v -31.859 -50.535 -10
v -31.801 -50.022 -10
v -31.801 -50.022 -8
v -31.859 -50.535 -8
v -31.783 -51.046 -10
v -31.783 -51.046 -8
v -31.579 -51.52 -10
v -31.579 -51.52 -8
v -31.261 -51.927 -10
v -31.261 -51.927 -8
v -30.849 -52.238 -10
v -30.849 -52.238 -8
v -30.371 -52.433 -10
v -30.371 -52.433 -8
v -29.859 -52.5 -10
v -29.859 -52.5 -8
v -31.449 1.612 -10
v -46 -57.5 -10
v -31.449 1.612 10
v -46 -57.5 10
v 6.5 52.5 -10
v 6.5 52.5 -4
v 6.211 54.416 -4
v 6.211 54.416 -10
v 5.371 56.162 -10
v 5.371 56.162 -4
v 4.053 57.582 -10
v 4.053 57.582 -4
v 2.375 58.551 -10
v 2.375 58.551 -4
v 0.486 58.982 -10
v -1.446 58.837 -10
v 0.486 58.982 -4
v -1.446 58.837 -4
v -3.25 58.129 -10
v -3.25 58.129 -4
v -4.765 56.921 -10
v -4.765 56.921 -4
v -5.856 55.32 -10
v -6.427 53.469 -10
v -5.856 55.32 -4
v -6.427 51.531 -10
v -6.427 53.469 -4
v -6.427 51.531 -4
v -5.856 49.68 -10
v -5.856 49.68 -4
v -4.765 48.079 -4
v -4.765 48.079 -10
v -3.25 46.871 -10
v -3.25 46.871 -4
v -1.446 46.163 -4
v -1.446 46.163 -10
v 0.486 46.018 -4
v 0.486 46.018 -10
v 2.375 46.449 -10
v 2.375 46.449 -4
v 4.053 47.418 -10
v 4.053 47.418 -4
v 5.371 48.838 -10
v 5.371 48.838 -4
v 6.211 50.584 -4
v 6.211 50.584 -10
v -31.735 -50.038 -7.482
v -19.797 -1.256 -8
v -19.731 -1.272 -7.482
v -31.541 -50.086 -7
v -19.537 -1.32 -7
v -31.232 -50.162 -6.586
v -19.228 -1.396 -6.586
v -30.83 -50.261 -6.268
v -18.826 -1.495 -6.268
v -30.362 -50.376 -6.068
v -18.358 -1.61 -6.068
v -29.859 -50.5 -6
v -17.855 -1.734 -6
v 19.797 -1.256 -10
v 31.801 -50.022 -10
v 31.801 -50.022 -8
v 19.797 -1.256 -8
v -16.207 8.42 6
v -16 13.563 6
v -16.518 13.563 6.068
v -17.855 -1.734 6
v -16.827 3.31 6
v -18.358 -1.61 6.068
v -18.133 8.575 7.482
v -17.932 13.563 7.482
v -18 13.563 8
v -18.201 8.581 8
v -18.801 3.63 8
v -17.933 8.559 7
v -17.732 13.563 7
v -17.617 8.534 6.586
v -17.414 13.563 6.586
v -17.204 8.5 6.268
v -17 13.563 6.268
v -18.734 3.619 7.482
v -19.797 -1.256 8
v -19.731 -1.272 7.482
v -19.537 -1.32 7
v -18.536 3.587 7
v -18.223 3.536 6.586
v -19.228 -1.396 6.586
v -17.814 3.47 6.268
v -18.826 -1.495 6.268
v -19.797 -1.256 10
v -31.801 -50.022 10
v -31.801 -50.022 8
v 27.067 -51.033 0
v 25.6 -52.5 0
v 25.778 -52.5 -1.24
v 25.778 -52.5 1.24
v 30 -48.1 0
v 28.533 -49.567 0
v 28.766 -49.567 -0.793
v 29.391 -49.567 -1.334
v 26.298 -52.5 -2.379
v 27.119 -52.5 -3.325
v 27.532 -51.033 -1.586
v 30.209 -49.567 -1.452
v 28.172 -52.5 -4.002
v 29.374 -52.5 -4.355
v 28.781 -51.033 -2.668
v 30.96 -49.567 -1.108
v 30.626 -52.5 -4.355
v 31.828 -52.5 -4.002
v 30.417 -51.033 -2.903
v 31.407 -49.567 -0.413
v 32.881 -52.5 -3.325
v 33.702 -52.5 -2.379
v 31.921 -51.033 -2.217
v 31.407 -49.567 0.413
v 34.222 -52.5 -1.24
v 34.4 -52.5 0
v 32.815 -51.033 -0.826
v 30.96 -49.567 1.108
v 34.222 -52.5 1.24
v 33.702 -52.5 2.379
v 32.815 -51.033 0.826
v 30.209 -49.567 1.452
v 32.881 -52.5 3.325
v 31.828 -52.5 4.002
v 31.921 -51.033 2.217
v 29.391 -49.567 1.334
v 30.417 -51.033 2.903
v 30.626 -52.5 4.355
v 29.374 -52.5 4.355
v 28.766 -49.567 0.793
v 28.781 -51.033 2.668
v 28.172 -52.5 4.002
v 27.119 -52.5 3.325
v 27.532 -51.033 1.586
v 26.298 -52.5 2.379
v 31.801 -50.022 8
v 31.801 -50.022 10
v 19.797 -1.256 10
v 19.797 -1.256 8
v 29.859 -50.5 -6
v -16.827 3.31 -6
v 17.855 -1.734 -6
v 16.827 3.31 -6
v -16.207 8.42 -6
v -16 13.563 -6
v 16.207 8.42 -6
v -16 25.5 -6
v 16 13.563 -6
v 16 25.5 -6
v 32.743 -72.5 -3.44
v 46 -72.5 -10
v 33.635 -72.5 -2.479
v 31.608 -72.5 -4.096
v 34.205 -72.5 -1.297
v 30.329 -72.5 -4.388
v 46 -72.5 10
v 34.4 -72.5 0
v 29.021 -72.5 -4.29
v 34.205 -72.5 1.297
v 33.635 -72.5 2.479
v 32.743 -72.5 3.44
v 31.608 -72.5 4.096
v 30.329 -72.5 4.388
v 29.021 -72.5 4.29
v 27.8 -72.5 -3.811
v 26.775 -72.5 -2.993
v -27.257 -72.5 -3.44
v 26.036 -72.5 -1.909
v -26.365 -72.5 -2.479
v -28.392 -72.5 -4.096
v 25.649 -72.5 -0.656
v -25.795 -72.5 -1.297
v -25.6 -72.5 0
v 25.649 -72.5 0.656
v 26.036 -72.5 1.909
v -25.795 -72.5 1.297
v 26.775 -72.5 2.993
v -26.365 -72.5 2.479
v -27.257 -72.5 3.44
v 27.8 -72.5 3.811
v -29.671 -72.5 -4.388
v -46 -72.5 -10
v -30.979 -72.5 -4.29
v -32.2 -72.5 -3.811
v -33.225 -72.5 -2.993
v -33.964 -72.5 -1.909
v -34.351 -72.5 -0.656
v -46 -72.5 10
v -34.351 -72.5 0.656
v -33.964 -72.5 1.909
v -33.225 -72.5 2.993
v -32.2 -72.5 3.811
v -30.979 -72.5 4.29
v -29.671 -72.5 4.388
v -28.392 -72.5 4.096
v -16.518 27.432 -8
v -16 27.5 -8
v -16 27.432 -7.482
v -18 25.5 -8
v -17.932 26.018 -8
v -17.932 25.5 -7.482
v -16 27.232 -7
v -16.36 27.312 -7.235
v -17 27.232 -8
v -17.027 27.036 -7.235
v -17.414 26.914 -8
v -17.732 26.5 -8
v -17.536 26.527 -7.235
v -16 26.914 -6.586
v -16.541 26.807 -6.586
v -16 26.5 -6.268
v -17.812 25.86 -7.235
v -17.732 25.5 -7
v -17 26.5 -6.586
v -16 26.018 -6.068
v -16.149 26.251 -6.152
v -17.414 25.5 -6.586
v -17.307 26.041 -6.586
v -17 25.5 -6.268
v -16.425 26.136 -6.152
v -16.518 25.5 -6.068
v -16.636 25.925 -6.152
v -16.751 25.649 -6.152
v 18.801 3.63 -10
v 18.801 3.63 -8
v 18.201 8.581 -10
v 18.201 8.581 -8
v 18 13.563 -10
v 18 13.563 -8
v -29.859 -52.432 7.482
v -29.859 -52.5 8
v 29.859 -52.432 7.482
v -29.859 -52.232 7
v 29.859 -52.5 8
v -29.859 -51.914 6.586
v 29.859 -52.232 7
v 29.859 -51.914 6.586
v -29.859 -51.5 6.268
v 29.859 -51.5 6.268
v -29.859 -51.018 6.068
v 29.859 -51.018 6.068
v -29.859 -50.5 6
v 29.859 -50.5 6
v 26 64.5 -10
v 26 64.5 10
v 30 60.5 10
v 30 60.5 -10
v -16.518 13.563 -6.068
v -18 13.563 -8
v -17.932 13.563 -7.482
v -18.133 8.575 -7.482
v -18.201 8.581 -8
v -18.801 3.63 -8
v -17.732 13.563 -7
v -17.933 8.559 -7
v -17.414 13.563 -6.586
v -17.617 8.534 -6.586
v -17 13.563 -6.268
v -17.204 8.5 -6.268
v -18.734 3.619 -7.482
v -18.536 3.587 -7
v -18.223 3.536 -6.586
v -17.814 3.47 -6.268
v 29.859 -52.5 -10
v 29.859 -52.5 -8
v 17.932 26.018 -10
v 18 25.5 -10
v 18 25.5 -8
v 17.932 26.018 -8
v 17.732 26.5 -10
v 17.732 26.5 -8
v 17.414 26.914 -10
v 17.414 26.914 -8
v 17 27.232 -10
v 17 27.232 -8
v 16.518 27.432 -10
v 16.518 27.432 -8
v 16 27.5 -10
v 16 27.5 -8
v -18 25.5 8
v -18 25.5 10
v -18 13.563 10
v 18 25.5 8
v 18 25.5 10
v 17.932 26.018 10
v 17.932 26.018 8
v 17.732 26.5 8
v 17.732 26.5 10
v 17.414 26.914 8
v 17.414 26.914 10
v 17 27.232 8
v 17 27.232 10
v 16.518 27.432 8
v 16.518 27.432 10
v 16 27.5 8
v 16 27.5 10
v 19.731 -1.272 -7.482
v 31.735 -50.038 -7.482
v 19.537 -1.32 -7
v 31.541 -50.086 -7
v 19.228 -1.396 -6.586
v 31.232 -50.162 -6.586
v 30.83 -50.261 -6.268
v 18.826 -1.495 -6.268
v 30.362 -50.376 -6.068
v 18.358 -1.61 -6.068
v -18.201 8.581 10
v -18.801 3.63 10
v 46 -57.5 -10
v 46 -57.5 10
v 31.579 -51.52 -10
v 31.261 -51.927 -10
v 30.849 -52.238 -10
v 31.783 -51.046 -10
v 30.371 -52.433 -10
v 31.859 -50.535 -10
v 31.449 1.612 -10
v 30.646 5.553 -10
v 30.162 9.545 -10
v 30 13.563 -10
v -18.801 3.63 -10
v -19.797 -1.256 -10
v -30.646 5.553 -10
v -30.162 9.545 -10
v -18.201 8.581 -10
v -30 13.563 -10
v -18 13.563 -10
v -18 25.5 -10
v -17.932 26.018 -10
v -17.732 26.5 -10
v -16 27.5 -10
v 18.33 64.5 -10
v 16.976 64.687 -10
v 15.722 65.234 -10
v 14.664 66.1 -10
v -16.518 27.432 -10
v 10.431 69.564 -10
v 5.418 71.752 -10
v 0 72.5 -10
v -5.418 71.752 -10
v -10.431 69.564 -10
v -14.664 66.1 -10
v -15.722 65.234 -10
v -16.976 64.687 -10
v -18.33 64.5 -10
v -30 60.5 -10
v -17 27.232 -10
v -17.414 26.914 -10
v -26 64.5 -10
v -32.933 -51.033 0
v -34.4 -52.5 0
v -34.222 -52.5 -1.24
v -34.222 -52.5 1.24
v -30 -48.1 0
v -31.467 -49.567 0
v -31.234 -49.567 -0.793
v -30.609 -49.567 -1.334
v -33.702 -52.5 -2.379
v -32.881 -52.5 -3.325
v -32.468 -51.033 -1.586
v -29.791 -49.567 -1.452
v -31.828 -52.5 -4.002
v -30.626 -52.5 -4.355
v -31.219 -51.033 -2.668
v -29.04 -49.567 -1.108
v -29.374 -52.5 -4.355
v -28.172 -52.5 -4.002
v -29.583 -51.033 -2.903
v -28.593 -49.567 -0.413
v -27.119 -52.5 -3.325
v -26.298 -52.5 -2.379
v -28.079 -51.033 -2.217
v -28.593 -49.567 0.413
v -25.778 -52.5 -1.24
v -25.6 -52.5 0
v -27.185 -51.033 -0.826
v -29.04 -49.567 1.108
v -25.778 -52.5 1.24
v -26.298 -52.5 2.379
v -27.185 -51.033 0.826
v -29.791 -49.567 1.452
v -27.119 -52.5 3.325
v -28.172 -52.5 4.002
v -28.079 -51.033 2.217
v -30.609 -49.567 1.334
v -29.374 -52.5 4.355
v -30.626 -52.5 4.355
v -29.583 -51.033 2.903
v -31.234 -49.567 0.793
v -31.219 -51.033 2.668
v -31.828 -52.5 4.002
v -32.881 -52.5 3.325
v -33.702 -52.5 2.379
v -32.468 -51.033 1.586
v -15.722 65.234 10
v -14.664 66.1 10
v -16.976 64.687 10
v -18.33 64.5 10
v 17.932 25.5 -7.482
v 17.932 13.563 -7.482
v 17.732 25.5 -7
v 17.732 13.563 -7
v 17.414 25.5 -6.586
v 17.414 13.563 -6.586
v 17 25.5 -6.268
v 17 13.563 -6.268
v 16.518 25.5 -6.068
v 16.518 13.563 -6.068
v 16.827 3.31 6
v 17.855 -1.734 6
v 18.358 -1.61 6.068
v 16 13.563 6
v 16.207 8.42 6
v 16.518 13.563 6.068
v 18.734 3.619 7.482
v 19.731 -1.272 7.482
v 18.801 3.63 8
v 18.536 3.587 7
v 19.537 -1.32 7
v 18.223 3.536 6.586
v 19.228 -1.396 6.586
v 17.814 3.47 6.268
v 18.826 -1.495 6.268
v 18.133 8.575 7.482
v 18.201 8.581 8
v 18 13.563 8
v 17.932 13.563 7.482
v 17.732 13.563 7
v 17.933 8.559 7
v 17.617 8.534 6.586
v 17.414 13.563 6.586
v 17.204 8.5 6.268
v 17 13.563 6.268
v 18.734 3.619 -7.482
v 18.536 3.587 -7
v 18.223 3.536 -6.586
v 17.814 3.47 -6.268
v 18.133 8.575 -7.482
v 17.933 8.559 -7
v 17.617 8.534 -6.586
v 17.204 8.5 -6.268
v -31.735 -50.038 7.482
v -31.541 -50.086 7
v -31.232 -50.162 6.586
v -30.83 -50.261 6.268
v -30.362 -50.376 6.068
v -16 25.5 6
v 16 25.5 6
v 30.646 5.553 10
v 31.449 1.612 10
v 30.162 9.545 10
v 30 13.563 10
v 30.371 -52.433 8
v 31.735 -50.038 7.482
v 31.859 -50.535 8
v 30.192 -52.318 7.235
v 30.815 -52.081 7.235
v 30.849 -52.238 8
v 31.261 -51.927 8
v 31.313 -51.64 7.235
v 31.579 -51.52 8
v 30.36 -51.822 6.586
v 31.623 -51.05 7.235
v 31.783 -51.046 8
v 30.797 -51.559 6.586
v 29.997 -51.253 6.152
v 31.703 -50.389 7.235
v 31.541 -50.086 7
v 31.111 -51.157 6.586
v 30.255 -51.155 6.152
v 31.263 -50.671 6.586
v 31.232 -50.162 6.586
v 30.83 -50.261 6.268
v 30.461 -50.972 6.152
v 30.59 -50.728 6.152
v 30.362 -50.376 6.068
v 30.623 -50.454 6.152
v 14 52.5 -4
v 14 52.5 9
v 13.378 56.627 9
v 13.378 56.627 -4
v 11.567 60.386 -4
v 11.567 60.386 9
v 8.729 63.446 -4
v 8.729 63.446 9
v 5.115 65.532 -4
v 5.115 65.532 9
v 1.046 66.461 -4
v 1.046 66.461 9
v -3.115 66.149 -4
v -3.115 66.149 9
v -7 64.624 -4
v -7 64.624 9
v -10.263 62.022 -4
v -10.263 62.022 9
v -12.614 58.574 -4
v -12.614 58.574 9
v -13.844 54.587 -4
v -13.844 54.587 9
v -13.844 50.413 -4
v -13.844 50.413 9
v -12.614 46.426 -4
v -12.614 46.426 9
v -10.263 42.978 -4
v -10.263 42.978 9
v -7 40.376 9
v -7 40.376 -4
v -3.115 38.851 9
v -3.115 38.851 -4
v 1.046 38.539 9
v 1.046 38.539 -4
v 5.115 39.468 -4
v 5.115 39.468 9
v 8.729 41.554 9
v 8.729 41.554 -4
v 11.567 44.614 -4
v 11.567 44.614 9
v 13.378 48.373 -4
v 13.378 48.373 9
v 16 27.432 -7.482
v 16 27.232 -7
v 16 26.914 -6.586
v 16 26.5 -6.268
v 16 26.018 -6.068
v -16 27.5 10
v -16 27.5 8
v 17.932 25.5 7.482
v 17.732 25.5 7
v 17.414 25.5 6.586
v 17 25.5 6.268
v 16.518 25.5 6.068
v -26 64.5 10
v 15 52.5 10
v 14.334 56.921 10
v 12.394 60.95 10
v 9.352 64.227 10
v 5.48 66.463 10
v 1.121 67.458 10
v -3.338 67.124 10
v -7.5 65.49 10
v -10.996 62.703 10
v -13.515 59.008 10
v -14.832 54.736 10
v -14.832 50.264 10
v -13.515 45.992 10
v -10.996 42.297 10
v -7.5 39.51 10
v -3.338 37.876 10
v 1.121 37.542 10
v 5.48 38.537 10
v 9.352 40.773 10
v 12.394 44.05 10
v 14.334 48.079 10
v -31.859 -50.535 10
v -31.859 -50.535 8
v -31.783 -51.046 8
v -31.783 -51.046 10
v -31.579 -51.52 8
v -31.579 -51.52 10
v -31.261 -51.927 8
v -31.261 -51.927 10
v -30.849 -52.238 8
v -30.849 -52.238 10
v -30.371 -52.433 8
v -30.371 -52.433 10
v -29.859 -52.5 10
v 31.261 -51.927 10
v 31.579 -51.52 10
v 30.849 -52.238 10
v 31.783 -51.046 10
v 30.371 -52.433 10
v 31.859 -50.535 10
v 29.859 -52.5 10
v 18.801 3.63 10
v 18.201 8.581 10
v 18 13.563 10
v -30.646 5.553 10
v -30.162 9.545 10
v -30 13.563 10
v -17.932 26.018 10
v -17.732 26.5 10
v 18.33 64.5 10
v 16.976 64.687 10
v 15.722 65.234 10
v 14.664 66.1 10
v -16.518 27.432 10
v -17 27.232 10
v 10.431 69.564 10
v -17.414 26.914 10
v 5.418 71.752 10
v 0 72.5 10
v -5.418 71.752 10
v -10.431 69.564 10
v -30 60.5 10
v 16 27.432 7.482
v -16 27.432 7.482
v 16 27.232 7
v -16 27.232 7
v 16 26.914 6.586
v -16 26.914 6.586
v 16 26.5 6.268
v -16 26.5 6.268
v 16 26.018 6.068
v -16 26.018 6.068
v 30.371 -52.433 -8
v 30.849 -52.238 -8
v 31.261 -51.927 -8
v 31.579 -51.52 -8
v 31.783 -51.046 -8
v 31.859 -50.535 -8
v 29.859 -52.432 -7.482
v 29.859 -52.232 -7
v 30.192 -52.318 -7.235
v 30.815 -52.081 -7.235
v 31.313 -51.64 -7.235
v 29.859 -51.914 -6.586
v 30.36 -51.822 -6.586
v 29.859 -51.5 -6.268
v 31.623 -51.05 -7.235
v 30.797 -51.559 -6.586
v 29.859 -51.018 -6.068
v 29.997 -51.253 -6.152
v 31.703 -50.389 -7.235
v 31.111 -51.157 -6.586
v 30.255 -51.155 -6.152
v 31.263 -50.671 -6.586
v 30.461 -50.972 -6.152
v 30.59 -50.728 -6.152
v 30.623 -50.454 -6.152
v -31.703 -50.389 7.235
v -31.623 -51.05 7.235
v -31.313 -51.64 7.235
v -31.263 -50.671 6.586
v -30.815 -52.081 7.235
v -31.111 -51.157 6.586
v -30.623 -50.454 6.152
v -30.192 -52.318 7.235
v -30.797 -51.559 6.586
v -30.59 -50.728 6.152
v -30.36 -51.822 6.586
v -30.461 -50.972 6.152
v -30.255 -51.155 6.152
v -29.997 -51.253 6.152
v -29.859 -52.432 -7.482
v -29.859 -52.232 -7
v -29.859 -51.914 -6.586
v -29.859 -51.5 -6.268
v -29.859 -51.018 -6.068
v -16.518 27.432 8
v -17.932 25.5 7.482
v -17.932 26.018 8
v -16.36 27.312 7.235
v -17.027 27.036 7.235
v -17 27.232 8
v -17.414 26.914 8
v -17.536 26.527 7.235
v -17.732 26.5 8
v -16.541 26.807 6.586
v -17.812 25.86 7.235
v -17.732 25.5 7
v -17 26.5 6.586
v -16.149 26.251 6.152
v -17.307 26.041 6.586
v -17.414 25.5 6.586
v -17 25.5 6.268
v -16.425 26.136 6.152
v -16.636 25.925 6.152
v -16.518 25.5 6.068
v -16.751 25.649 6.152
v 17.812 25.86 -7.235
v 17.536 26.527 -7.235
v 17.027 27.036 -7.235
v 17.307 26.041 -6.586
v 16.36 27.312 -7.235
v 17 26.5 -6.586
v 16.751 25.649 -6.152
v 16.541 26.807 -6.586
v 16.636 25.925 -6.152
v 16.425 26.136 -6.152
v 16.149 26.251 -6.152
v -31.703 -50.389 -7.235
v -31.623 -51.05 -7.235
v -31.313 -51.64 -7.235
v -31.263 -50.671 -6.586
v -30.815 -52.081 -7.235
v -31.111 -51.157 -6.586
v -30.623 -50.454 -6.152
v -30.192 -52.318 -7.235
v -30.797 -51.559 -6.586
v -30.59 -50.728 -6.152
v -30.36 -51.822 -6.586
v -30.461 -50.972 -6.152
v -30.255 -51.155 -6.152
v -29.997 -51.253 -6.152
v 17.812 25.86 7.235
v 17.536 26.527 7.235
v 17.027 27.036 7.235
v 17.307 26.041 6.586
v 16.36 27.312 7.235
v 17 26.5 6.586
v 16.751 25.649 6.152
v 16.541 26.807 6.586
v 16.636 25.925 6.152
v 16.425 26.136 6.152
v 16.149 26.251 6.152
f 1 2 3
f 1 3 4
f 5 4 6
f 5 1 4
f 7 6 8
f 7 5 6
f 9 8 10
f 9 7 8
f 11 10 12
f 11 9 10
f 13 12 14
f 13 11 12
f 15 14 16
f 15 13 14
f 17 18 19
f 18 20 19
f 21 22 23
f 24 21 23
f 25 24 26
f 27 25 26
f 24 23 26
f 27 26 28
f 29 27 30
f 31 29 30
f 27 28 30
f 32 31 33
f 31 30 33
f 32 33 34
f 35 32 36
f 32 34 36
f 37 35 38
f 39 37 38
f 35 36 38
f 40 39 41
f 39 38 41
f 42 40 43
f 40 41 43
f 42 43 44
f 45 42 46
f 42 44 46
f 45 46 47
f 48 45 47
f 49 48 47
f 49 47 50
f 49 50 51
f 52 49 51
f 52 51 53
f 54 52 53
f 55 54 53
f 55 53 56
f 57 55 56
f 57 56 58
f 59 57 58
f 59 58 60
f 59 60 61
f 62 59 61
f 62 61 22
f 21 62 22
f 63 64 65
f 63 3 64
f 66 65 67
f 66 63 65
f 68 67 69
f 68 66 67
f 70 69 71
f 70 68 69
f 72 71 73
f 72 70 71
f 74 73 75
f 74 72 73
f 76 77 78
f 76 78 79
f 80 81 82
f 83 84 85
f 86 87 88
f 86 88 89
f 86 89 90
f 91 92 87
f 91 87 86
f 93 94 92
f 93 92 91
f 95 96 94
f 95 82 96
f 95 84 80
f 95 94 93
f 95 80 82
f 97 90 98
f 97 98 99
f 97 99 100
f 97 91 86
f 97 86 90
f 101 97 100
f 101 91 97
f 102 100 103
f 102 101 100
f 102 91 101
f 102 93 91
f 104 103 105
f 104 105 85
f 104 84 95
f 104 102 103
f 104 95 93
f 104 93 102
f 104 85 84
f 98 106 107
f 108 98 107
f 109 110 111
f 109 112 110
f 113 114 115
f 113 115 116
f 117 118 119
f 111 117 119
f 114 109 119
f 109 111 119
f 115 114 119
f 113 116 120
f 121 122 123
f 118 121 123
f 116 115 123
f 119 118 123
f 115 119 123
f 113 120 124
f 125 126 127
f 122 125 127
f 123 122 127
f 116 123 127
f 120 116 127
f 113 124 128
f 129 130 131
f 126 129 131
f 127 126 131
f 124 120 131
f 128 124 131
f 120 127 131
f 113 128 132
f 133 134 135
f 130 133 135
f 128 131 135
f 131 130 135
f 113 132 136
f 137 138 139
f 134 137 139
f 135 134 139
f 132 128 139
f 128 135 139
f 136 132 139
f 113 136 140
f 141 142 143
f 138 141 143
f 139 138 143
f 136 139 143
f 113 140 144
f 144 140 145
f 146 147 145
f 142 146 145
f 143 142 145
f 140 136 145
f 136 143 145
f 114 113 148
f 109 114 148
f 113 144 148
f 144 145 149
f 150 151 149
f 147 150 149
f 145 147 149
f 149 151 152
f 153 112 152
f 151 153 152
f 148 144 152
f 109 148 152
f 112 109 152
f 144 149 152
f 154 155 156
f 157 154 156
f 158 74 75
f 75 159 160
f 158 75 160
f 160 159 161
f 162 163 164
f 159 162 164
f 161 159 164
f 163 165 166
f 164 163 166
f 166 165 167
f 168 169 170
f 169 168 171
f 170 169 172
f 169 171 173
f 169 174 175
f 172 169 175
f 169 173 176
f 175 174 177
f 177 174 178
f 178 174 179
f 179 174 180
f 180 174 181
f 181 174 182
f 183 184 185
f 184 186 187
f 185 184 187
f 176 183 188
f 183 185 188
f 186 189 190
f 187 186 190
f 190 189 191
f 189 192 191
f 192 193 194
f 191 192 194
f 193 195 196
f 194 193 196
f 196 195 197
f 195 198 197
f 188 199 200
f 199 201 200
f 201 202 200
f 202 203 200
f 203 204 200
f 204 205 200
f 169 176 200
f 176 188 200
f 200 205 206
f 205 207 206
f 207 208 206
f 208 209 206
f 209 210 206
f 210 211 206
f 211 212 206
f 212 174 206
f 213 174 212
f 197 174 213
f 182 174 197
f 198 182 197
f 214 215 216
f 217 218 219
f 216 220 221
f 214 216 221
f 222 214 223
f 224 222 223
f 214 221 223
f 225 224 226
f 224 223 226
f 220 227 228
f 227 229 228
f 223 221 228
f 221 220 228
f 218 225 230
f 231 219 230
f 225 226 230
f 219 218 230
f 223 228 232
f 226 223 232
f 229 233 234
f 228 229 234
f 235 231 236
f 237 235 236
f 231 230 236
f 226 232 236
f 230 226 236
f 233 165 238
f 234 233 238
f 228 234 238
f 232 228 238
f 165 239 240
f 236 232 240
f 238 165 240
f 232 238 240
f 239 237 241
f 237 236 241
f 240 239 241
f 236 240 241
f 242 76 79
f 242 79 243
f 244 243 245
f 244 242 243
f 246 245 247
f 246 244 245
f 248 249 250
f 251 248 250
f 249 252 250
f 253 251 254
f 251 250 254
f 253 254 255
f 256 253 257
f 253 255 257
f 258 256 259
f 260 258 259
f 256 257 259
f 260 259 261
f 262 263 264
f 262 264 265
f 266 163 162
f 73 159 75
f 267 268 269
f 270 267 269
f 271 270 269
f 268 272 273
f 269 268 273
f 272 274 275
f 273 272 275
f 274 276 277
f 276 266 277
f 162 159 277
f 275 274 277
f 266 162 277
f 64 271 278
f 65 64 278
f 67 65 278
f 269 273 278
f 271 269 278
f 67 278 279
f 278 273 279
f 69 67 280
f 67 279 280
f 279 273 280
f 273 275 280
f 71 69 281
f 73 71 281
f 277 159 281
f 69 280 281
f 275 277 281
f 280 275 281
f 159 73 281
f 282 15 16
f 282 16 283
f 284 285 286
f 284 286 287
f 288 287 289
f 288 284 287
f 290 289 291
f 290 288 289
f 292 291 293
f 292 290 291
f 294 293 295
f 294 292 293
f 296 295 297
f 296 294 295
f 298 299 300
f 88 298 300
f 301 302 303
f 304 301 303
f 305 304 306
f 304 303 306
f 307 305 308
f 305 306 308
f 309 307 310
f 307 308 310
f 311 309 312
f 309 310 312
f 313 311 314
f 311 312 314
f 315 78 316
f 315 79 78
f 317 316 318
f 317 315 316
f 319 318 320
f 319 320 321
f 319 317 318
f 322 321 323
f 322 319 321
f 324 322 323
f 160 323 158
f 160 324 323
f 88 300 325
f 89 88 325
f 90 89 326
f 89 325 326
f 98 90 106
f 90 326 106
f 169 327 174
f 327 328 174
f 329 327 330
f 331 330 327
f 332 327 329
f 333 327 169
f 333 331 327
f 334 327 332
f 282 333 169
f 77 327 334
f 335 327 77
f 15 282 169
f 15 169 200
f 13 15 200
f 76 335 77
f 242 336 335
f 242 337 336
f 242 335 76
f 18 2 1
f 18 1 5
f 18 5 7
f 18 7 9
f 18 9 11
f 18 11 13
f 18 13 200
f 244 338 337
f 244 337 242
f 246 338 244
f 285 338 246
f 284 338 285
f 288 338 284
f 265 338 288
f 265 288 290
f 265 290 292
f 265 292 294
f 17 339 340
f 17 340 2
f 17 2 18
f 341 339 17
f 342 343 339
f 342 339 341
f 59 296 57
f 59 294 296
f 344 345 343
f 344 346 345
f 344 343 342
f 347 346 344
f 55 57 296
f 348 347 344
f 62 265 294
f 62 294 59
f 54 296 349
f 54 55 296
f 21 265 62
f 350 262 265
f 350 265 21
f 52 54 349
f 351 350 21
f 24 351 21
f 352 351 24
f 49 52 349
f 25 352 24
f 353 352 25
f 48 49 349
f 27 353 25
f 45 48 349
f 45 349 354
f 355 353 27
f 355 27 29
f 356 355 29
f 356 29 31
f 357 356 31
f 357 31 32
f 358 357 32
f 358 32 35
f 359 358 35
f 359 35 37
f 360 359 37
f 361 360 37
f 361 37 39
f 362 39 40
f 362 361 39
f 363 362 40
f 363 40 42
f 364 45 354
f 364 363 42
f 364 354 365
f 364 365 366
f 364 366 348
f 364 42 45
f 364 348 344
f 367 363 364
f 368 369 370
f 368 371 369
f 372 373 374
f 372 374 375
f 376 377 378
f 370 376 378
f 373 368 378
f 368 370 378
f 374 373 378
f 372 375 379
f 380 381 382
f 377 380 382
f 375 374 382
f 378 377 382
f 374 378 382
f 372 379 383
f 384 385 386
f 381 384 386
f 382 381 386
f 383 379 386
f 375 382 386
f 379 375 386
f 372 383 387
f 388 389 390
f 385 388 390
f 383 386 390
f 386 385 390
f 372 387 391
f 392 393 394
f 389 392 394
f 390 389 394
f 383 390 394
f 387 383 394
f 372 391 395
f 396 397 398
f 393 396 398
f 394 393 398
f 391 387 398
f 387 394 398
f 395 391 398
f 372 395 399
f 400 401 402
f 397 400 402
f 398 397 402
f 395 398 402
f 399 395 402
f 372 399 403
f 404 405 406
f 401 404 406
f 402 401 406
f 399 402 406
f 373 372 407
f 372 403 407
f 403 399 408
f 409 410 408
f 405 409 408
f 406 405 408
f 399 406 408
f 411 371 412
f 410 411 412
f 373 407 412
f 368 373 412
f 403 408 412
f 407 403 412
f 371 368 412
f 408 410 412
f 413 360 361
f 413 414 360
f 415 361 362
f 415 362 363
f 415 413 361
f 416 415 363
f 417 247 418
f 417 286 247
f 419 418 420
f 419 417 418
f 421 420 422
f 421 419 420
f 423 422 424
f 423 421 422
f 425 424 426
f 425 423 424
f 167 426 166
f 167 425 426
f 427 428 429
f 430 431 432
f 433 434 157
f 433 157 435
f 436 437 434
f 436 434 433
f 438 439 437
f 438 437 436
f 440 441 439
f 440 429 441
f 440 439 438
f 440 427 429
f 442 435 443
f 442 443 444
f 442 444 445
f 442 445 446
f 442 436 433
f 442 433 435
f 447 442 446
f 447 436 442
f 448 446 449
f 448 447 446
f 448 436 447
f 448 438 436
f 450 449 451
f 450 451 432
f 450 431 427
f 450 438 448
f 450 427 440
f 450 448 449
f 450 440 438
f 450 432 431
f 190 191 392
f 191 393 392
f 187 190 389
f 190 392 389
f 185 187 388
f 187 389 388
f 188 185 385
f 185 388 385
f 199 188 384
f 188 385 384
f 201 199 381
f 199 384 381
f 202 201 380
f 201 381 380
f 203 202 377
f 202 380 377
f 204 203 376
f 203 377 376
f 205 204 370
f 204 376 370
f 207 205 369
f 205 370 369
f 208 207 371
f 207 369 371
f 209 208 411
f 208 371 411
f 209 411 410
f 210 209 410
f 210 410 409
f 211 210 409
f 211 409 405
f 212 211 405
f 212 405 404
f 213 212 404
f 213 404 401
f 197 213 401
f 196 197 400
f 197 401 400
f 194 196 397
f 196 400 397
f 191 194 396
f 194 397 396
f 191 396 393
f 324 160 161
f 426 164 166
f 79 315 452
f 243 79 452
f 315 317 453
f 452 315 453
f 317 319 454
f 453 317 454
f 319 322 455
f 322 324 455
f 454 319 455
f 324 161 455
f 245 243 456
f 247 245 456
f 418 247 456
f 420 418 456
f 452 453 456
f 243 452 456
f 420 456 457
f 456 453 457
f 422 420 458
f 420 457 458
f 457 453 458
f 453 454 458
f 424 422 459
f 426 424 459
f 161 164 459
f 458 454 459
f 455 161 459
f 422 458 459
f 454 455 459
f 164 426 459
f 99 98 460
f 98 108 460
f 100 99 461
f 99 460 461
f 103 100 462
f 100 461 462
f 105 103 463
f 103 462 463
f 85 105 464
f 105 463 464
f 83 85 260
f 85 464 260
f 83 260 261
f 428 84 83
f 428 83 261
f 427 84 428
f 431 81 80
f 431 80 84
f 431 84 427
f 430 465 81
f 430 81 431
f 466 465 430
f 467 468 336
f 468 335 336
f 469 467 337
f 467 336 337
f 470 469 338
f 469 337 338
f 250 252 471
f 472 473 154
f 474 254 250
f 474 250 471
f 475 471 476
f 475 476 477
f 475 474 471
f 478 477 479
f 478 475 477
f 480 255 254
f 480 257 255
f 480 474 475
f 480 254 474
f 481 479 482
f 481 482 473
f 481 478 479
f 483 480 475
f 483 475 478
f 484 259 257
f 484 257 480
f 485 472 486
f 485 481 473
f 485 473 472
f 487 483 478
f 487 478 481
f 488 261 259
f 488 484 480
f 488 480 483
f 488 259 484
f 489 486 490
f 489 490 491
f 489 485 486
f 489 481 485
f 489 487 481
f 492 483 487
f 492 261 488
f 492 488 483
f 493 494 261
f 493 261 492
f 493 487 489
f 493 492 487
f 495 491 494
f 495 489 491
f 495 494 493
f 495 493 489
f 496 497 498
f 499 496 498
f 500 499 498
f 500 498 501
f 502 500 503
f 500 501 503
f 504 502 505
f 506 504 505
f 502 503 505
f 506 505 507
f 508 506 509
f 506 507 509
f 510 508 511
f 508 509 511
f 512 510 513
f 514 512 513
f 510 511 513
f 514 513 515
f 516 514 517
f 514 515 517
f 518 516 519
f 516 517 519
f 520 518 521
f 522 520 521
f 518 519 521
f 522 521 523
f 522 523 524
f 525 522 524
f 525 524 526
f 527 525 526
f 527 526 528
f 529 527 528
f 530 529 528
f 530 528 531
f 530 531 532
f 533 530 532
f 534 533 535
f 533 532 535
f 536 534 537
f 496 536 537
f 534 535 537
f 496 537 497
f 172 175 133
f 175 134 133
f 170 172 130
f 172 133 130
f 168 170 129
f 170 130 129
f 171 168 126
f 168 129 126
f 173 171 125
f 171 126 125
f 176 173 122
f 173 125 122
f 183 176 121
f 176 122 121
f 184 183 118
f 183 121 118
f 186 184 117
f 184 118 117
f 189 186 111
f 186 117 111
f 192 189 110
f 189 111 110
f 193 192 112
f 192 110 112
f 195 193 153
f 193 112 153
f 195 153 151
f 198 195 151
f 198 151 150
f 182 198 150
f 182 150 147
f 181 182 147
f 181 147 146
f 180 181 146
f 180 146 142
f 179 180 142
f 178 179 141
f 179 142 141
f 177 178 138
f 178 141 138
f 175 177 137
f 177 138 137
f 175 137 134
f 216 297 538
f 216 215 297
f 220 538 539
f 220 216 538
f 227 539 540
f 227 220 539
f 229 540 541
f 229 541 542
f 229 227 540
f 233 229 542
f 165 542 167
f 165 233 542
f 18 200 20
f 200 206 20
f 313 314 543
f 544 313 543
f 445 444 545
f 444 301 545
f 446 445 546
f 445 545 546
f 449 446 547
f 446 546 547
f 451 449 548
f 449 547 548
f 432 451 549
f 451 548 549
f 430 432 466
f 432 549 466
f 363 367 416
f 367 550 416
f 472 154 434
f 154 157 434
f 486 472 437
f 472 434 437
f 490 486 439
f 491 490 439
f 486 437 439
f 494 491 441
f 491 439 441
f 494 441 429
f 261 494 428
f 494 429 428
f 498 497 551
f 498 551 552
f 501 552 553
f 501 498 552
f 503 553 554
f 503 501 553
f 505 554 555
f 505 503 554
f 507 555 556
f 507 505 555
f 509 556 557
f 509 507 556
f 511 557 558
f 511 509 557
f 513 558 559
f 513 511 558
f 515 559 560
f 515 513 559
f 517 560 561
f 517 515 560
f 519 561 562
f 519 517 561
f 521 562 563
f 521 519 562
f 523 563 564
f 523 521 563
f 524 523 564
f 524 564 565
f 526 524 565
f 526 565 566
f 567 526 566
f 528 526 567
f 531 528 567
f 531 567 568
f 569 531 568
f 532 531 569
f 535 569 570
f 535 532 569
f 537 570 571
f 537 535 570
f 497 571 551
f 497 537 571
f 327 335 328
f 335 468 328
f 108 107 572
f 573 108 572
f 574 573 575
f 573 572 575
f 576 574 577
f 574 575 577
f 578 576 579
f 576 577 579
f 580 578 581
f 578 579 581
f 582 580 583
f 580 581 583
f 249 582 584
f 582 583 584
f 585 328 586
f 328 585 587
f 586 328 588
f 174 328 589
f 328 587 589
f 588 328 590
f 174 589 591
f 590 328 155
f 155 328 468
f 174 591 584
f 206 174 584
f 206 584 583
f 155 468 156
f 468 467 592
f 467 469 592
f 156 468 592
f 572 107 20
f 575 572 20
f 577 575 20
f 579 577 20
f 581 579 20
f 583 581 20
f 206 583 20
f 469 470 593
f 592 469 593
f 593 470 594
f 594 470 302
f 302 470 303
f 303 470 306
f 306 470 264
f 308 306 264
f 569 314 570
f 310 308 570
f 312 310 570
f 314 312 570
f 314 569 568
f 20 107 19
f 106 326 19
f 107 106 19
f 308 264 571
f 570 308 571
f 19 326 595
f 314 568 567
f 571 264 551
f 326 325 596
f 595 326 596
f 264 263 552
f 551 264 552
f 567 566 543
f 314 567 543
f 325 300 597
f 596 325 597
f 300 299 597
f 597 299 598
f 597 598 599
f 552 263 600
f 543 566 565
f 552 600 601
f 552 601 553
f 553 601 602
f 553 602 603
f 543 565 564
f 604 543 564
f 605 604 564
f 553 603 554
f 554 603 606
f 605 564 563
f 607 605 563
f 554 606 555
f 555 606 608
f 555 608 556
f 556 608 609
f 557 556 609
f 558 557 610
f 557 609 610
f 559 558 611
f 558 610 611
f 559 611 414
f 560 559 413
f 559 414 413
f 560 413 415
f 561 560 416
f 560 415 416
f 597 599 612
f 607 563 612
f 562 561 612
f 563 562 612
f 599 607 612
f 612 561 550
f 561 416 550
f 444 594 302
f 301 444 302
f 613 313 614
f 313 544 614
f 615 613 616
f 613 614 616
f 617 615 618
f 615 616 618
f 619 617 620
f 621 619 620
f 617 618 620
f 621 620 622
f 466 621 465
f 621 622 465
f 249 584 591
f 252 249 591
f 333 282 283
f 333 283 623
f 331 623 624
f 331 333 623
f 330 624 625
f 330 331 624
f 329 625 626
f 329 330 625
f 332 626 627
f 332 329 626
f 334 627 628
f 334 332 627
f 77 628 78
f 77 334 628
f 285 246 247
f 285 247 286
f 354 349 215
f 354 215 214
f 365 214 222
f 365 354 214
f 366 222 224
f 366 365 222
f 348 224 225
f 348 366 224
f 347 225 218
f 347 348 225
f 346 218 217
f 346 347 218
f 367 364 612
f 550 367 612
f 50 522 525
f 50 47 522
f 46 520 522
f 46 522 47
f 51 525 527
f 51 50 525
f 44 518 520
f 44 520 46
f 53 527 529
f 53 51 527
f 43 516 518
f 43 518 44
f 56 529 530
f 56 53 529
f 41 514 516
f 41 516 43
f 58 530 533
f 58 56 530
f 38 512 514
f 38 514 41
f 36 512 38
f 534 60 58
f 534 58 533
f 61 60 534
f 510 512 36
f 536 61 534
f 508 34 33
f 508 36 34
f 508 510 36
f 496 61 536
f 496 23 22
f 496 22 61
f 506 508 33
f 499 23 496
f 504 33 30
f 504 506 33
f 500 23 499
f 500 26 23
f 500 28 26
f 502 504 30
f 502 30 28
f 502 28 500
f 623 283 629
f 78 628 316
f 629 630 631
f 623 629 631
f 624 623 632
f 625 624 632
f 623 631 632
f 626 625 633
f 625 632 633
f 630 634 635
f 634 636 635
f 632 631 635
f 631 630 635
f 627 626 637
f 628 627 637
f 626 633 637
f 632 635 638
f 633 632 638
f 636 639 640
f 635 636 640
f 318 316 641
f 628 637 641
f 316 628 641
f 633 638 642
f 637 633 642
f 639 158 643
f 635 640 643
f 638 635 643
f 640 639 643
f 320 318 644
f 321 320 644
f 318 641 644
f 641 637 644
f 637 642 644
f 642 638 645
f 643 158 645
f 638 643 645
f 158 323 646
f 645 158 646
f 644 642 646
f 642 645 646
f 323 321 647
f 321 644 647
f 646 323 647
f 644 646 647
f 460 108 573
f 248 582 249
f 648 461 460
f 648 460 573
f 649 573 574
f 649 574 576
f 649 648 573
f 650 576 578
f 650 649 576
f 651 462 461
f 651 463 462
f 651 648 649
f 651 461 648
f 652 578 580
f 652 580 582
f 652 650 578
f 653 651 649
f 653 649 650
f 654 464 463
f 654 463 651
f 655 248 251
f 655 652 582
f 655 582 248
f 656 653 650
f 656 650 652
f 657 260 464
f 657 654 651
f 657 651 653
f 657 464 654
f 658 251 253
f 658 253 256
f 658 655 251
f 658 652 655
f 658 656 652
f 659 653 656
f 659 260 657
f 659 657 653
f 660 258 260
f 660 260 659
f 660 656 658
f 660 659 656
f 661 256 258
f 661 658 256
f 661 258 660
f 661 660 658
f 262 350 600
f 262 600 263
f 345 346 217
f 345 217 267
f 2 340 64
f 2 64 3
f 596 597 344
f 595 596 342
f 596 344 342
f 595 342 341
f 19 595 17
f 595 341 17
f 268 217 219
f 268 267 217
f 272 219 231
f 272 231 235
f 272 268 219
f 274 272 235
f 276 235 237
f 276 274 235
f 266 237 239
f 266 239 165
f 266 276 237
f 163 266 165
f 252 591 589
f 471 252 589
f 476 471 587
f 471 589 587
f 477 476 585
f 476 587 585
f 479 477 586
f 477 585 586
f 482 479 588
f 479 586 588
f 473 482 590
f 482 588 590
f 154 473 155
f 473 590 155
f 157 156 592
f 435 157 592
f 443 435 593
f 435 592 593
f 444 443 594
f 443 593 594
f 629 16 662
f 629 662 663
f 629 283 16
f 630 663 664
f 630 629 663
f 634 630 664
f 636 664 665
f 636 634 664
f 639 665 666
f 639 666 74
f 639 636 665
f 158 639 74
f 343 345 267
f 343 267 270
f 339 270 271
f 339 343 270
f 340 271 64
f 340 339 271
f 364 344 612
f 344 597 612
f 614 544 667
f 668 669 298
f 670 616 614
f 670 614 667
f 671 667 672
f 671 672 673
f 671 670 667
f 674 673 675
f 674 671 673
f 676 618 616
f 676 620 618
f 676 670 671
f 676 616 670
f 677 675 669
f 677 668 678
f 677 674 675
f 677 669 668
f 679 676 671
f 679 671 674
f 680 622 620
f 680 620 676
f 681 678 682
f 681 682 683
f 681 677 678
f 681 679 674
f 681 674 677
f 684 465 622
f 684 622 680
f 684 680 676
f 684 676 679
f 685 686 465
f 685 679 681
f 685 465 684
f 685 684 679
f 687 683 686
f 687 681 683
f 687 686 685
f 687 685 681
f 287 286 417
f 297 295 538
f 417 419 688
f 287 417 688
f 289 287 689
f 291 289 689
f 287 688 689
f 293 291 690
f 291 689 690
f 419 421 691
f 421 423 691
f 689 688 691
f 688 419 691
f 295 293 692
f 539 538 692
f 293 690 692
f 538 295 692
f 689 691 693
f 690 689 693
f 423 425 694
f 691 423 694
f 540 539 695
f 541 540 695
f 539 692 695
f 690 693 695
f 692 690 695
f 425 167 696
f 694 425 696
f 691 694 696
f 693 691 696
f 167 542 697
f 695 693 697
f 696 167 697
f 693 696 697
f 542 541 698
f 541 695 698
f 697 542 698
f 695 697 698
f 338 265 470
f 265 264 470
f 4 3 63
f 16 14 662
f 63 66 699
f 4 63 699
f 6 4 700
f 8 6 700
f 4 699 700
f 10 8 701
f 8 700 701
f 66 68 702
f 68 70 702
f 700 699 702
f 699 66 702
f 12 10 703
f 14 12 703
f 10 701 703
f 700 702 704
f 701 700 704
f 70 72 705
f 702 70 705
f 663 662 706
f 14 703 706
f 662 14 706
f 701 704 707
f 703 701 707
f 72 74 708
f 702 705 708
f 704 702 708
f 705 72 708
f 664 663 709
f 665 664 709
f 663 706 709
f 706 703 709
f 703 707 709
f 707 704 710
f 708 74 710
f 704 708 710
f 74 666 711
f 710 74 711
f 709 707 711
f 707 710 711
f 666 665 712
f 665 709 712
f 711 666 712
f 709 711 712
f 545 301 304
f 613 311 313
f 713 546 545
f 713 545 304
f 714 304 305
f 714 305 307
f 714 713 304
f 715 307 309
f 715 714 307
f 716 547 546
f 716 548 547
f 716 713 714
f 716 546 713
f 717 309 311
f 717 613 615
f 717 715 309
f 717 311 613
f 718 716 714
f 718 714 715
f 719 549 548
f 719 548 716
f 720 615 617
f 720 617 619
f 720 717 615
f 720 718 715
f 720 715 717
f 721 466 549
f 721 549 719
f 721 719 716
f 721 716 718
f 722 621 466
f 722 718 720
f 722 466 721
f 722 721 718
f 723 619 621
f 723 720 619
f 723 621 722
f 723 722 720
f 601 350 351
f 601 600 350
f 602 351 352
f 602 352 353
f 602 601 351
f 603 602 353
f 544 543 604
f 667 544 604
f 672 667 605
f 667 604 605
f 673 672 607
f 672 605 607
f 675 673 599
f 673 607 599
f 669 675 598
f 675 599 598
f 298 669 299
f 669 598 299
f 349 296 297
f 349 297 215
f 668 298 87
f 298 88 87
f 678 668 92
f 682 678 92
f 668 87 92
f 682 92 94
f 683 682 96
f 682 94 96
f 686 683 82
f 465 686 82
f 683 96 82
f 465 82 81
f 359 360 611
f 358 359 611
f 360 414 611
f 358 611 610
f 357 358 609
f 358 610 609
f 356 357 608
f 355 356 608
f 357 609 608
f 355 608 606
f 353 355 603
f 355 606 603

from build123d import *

# Parameters (mm, degrees)
BOSS_EXTRUDE1_DEPTH               = 10
FILLET1_R                         = 50
FILLET2_R                         = 50
CUT_EXTRUDE1_DEPTH                = 4
SKETCH6_R                         = 6.5
CUT_EXTRUDE2_DEPTH                = 89.160365244
SKETCH7_R                         = 14
CUT_EXTRUDE3_DEPTH                = 14
CHAMFER1_SIZE                     = 4
FILLET3_R                         = 5
TAP_DRILL_FOR_M10X1_25_TAP1_D     = 8.8
TAP_DRILL_FOR_M10X1_25_TAP1_DEPTH = 20
TAP_DRILL_FOR_M10X1_25_TAP1_TIP   = 4.4
CHAMFER2_SIZE                     = 1
FILLET4_R                         = 2


with BuildPart() as part:
    # Sketch2 → Boss-Extrude1 (new, symmetric)
    with BuildSketch(Plane.XY):
        with BuildLine():
            Line((16, 64.5), (30, 64.5))
            Line((30, 64.5), (30, 7.5))
            Line((30, 7.5), (46, -57.5))
            Line((46, -57.5), (46, -72.5))
            Line((46, -72.5), (-46, -72.5))
            Line((-46, -72.5), (-46, -57.5))
            Line((-46, -57.5), (-30, 7.5))
            Line((-30, 7.5), (-30, 64.5))
            Line((-30, 64.5), (-16, 64.5))
            ThreePointArc((-16, 64.5), (0, 72.5), (16, 64.5))
        make_face()
    extrude(amount=BOSS_EXTRUDE1_DEPTH, both=True)

    # Fillet1
    fillet1_edges = [part.edges().sort_by_distance(p)[0] for p in [
        (-30, 7.5, 0),
    ]]
    fillet(fillet1_edges, radius=FILLET1_R)

    # Fillet2
    fillet2_edges = [part.edges().sort_by_distance(p)[0] for p in [
        (30, 7.5, 0),
    ]]
    fillet(fillet2_edges, radius=FILLET2_R)

    # Sketch5 → Cut-Extrude1 (cut)
    with BuildSketch(Plane.XY.offset(10)):
        with BuildLine():
            Line((-19.797077506, -1.255831282), (-31.801048121, -50.021961906))
            ThreePointArc((-31.801048121, -50.021961906), (-31.433196909, -51.733678202), (-29.859018363, -52.5))
            Line((-29.859018363, -52.5), (29.859018363, -52.5))
            ThreePointArc((29.859018363, -52.5), (31.433196909, -51.733678202), (31.801048121, -50.021961906))
            Line((31.801048121, -50.021961906), (19.797077506, -1.255831282))
            ThreePointArc((19.797077506, -1.255831282), (18.450909046, 6.09947647), (18, 13.56334964))
            Line((18, 13.56334964), (18, 25.5))
            ThreePointArc((18, 25.5), (17.414213562, 26.914213562), (16, 27.5))
            Line((16, 27.5), (-16, 27.5))
            ThreePointArc((-16, 27.5), (-17.414213562, 26.914213562), (-18, 25.5))
            Line((-18, 25.5), (-18, 13.56334964))
            ThreePointArc((-18, 13.56334964), (-18.450909046, 6.09947647), (-19.797077506, -1.255831282))
        make_face()
    cut_extrude1 = extrude(amount=-CUT_EXTRUDE1_DEPTH, mode=Mode.SUBTRACT)

    # Mirror1: Cut-Extrude1 across plane
    add(cut_extrude1.mirror(Plane.XY), mode=Mode.SUBTRACT)

    # Sketch6 → Cut-Extrude2 (cut, through all)
    with BuildSketch(Plane.XY.offset(10)):
        with Locations((0, 52.5)):
            Circle(SKETCH6_R)
    extrude(amount=-CUT_EXTRUDE2_DEPTH, mode=Mode.SUBTRACT)

    # Sketch7 → Cut-Extrude3 (cut)
    with BuildSketch(Plane.XY.offset(10)):
        with Locations((0, 52.5)):
            Circle(SKETCH7_R)
    extrude(amount=-CUT_EXTRUDE3_DEPTH, mode=Mode.SUBTRACT)

    # Chamfer1
    chamfer1_edges = [part.edges().sort_by_distance(p)[0] for p in [
        (-30, 64.5, 0),
        (30, 64.5, 0),
    ]]
    chamfer(chamfer1_edges, length=CHAMFER1_SIZE)

    # Fillet3
    fillet3_edges = [part.edges().sort_by_distance(p)[0] for p in [
        (-16, 64.5, 0),
        (16, 64.5, 0),
    ]]
    fillet(fillet3_edges, radius=FILLET3_R)

    # Tap Drill for M10x1.25 Tap1
    with Locations(Plane(origin=(0, -72.5, 0), x_dir=(-1, 0, 0), z_dir=(0, -1, 0))):
        with Locations((30, 0), (-30, 0)):
            Hole(TAP_DRILL_FOR_M10X1_25_TAP1_D / 2, depth=TAP_DRILL_FOR_M10X1_25_TAP1_DEPTH)
            with Locations((0, 0, -(TAP_DRILL_FOR_M10X1_25_TAP1_DEPTH + TAP_DRILL_FOR_M10X1_25_TAP1_TIP / 2))):  # 90° drill point
                Cone(0, TAP_DRILL_FOR_M10X1_25_TAP1_D / 2, TAP_DRILL_FOR_M10X1_25_TAP1_TIP, mode=Mode.SUBTRACT)

    # Chamfer2
    chamfer2_edges = [part.edges().sort_by_distance(p)[0] for p in [
        (-14, 52.5, 10),
    ]]
    chamfer(chamfer2_edges, length=CHAMFER2_SIZE)

    # Fillet4
    fillet4_edges = [part.edges().sort_by_distance(p)[0] for p in [
        (31.433196909, -51.733678202, 6),
        (0, -52.5, 6),
        (-31.433196909, -51.733678202, 6),
        (-25.799062814, -25.638896594, 6),
        (-18.450909046, 6.09947647, 6),
        (-18, 19.53167482, 6),
        (-17.414213562, 26.914213562, 6),
        (0, 27.5, 6),
        (17.414213562, 26.914213562, 6),
        (18, 19.53167482, 6),
        (18.450909046, 6.09947647, 6),
        (25.799062814, -25.638896594, 6),
        (31.433196909, -51.733678202, -6),
        (25.799062814, -25.638896594, -6),
        (18.450909046, 6.09947647, -6),
        (18, 19.53167482, -6),
        (17.414213562, 26.914213562, -6),
        (0, 27.5, -6),
        (-17.414213562, 26.914213562, -6),
        (-18, 19.53167482, -6),
        (-18.450909046, 6.09947647, -6),
        (-25.799062814, -25.638896594, -6),
        (-31.433196909, -51.733678202, -6),
        (0, -52.5, -6),
    ]]
    fillet(fillet4_edges, radius=FILLET4_R)


solid = part.part
